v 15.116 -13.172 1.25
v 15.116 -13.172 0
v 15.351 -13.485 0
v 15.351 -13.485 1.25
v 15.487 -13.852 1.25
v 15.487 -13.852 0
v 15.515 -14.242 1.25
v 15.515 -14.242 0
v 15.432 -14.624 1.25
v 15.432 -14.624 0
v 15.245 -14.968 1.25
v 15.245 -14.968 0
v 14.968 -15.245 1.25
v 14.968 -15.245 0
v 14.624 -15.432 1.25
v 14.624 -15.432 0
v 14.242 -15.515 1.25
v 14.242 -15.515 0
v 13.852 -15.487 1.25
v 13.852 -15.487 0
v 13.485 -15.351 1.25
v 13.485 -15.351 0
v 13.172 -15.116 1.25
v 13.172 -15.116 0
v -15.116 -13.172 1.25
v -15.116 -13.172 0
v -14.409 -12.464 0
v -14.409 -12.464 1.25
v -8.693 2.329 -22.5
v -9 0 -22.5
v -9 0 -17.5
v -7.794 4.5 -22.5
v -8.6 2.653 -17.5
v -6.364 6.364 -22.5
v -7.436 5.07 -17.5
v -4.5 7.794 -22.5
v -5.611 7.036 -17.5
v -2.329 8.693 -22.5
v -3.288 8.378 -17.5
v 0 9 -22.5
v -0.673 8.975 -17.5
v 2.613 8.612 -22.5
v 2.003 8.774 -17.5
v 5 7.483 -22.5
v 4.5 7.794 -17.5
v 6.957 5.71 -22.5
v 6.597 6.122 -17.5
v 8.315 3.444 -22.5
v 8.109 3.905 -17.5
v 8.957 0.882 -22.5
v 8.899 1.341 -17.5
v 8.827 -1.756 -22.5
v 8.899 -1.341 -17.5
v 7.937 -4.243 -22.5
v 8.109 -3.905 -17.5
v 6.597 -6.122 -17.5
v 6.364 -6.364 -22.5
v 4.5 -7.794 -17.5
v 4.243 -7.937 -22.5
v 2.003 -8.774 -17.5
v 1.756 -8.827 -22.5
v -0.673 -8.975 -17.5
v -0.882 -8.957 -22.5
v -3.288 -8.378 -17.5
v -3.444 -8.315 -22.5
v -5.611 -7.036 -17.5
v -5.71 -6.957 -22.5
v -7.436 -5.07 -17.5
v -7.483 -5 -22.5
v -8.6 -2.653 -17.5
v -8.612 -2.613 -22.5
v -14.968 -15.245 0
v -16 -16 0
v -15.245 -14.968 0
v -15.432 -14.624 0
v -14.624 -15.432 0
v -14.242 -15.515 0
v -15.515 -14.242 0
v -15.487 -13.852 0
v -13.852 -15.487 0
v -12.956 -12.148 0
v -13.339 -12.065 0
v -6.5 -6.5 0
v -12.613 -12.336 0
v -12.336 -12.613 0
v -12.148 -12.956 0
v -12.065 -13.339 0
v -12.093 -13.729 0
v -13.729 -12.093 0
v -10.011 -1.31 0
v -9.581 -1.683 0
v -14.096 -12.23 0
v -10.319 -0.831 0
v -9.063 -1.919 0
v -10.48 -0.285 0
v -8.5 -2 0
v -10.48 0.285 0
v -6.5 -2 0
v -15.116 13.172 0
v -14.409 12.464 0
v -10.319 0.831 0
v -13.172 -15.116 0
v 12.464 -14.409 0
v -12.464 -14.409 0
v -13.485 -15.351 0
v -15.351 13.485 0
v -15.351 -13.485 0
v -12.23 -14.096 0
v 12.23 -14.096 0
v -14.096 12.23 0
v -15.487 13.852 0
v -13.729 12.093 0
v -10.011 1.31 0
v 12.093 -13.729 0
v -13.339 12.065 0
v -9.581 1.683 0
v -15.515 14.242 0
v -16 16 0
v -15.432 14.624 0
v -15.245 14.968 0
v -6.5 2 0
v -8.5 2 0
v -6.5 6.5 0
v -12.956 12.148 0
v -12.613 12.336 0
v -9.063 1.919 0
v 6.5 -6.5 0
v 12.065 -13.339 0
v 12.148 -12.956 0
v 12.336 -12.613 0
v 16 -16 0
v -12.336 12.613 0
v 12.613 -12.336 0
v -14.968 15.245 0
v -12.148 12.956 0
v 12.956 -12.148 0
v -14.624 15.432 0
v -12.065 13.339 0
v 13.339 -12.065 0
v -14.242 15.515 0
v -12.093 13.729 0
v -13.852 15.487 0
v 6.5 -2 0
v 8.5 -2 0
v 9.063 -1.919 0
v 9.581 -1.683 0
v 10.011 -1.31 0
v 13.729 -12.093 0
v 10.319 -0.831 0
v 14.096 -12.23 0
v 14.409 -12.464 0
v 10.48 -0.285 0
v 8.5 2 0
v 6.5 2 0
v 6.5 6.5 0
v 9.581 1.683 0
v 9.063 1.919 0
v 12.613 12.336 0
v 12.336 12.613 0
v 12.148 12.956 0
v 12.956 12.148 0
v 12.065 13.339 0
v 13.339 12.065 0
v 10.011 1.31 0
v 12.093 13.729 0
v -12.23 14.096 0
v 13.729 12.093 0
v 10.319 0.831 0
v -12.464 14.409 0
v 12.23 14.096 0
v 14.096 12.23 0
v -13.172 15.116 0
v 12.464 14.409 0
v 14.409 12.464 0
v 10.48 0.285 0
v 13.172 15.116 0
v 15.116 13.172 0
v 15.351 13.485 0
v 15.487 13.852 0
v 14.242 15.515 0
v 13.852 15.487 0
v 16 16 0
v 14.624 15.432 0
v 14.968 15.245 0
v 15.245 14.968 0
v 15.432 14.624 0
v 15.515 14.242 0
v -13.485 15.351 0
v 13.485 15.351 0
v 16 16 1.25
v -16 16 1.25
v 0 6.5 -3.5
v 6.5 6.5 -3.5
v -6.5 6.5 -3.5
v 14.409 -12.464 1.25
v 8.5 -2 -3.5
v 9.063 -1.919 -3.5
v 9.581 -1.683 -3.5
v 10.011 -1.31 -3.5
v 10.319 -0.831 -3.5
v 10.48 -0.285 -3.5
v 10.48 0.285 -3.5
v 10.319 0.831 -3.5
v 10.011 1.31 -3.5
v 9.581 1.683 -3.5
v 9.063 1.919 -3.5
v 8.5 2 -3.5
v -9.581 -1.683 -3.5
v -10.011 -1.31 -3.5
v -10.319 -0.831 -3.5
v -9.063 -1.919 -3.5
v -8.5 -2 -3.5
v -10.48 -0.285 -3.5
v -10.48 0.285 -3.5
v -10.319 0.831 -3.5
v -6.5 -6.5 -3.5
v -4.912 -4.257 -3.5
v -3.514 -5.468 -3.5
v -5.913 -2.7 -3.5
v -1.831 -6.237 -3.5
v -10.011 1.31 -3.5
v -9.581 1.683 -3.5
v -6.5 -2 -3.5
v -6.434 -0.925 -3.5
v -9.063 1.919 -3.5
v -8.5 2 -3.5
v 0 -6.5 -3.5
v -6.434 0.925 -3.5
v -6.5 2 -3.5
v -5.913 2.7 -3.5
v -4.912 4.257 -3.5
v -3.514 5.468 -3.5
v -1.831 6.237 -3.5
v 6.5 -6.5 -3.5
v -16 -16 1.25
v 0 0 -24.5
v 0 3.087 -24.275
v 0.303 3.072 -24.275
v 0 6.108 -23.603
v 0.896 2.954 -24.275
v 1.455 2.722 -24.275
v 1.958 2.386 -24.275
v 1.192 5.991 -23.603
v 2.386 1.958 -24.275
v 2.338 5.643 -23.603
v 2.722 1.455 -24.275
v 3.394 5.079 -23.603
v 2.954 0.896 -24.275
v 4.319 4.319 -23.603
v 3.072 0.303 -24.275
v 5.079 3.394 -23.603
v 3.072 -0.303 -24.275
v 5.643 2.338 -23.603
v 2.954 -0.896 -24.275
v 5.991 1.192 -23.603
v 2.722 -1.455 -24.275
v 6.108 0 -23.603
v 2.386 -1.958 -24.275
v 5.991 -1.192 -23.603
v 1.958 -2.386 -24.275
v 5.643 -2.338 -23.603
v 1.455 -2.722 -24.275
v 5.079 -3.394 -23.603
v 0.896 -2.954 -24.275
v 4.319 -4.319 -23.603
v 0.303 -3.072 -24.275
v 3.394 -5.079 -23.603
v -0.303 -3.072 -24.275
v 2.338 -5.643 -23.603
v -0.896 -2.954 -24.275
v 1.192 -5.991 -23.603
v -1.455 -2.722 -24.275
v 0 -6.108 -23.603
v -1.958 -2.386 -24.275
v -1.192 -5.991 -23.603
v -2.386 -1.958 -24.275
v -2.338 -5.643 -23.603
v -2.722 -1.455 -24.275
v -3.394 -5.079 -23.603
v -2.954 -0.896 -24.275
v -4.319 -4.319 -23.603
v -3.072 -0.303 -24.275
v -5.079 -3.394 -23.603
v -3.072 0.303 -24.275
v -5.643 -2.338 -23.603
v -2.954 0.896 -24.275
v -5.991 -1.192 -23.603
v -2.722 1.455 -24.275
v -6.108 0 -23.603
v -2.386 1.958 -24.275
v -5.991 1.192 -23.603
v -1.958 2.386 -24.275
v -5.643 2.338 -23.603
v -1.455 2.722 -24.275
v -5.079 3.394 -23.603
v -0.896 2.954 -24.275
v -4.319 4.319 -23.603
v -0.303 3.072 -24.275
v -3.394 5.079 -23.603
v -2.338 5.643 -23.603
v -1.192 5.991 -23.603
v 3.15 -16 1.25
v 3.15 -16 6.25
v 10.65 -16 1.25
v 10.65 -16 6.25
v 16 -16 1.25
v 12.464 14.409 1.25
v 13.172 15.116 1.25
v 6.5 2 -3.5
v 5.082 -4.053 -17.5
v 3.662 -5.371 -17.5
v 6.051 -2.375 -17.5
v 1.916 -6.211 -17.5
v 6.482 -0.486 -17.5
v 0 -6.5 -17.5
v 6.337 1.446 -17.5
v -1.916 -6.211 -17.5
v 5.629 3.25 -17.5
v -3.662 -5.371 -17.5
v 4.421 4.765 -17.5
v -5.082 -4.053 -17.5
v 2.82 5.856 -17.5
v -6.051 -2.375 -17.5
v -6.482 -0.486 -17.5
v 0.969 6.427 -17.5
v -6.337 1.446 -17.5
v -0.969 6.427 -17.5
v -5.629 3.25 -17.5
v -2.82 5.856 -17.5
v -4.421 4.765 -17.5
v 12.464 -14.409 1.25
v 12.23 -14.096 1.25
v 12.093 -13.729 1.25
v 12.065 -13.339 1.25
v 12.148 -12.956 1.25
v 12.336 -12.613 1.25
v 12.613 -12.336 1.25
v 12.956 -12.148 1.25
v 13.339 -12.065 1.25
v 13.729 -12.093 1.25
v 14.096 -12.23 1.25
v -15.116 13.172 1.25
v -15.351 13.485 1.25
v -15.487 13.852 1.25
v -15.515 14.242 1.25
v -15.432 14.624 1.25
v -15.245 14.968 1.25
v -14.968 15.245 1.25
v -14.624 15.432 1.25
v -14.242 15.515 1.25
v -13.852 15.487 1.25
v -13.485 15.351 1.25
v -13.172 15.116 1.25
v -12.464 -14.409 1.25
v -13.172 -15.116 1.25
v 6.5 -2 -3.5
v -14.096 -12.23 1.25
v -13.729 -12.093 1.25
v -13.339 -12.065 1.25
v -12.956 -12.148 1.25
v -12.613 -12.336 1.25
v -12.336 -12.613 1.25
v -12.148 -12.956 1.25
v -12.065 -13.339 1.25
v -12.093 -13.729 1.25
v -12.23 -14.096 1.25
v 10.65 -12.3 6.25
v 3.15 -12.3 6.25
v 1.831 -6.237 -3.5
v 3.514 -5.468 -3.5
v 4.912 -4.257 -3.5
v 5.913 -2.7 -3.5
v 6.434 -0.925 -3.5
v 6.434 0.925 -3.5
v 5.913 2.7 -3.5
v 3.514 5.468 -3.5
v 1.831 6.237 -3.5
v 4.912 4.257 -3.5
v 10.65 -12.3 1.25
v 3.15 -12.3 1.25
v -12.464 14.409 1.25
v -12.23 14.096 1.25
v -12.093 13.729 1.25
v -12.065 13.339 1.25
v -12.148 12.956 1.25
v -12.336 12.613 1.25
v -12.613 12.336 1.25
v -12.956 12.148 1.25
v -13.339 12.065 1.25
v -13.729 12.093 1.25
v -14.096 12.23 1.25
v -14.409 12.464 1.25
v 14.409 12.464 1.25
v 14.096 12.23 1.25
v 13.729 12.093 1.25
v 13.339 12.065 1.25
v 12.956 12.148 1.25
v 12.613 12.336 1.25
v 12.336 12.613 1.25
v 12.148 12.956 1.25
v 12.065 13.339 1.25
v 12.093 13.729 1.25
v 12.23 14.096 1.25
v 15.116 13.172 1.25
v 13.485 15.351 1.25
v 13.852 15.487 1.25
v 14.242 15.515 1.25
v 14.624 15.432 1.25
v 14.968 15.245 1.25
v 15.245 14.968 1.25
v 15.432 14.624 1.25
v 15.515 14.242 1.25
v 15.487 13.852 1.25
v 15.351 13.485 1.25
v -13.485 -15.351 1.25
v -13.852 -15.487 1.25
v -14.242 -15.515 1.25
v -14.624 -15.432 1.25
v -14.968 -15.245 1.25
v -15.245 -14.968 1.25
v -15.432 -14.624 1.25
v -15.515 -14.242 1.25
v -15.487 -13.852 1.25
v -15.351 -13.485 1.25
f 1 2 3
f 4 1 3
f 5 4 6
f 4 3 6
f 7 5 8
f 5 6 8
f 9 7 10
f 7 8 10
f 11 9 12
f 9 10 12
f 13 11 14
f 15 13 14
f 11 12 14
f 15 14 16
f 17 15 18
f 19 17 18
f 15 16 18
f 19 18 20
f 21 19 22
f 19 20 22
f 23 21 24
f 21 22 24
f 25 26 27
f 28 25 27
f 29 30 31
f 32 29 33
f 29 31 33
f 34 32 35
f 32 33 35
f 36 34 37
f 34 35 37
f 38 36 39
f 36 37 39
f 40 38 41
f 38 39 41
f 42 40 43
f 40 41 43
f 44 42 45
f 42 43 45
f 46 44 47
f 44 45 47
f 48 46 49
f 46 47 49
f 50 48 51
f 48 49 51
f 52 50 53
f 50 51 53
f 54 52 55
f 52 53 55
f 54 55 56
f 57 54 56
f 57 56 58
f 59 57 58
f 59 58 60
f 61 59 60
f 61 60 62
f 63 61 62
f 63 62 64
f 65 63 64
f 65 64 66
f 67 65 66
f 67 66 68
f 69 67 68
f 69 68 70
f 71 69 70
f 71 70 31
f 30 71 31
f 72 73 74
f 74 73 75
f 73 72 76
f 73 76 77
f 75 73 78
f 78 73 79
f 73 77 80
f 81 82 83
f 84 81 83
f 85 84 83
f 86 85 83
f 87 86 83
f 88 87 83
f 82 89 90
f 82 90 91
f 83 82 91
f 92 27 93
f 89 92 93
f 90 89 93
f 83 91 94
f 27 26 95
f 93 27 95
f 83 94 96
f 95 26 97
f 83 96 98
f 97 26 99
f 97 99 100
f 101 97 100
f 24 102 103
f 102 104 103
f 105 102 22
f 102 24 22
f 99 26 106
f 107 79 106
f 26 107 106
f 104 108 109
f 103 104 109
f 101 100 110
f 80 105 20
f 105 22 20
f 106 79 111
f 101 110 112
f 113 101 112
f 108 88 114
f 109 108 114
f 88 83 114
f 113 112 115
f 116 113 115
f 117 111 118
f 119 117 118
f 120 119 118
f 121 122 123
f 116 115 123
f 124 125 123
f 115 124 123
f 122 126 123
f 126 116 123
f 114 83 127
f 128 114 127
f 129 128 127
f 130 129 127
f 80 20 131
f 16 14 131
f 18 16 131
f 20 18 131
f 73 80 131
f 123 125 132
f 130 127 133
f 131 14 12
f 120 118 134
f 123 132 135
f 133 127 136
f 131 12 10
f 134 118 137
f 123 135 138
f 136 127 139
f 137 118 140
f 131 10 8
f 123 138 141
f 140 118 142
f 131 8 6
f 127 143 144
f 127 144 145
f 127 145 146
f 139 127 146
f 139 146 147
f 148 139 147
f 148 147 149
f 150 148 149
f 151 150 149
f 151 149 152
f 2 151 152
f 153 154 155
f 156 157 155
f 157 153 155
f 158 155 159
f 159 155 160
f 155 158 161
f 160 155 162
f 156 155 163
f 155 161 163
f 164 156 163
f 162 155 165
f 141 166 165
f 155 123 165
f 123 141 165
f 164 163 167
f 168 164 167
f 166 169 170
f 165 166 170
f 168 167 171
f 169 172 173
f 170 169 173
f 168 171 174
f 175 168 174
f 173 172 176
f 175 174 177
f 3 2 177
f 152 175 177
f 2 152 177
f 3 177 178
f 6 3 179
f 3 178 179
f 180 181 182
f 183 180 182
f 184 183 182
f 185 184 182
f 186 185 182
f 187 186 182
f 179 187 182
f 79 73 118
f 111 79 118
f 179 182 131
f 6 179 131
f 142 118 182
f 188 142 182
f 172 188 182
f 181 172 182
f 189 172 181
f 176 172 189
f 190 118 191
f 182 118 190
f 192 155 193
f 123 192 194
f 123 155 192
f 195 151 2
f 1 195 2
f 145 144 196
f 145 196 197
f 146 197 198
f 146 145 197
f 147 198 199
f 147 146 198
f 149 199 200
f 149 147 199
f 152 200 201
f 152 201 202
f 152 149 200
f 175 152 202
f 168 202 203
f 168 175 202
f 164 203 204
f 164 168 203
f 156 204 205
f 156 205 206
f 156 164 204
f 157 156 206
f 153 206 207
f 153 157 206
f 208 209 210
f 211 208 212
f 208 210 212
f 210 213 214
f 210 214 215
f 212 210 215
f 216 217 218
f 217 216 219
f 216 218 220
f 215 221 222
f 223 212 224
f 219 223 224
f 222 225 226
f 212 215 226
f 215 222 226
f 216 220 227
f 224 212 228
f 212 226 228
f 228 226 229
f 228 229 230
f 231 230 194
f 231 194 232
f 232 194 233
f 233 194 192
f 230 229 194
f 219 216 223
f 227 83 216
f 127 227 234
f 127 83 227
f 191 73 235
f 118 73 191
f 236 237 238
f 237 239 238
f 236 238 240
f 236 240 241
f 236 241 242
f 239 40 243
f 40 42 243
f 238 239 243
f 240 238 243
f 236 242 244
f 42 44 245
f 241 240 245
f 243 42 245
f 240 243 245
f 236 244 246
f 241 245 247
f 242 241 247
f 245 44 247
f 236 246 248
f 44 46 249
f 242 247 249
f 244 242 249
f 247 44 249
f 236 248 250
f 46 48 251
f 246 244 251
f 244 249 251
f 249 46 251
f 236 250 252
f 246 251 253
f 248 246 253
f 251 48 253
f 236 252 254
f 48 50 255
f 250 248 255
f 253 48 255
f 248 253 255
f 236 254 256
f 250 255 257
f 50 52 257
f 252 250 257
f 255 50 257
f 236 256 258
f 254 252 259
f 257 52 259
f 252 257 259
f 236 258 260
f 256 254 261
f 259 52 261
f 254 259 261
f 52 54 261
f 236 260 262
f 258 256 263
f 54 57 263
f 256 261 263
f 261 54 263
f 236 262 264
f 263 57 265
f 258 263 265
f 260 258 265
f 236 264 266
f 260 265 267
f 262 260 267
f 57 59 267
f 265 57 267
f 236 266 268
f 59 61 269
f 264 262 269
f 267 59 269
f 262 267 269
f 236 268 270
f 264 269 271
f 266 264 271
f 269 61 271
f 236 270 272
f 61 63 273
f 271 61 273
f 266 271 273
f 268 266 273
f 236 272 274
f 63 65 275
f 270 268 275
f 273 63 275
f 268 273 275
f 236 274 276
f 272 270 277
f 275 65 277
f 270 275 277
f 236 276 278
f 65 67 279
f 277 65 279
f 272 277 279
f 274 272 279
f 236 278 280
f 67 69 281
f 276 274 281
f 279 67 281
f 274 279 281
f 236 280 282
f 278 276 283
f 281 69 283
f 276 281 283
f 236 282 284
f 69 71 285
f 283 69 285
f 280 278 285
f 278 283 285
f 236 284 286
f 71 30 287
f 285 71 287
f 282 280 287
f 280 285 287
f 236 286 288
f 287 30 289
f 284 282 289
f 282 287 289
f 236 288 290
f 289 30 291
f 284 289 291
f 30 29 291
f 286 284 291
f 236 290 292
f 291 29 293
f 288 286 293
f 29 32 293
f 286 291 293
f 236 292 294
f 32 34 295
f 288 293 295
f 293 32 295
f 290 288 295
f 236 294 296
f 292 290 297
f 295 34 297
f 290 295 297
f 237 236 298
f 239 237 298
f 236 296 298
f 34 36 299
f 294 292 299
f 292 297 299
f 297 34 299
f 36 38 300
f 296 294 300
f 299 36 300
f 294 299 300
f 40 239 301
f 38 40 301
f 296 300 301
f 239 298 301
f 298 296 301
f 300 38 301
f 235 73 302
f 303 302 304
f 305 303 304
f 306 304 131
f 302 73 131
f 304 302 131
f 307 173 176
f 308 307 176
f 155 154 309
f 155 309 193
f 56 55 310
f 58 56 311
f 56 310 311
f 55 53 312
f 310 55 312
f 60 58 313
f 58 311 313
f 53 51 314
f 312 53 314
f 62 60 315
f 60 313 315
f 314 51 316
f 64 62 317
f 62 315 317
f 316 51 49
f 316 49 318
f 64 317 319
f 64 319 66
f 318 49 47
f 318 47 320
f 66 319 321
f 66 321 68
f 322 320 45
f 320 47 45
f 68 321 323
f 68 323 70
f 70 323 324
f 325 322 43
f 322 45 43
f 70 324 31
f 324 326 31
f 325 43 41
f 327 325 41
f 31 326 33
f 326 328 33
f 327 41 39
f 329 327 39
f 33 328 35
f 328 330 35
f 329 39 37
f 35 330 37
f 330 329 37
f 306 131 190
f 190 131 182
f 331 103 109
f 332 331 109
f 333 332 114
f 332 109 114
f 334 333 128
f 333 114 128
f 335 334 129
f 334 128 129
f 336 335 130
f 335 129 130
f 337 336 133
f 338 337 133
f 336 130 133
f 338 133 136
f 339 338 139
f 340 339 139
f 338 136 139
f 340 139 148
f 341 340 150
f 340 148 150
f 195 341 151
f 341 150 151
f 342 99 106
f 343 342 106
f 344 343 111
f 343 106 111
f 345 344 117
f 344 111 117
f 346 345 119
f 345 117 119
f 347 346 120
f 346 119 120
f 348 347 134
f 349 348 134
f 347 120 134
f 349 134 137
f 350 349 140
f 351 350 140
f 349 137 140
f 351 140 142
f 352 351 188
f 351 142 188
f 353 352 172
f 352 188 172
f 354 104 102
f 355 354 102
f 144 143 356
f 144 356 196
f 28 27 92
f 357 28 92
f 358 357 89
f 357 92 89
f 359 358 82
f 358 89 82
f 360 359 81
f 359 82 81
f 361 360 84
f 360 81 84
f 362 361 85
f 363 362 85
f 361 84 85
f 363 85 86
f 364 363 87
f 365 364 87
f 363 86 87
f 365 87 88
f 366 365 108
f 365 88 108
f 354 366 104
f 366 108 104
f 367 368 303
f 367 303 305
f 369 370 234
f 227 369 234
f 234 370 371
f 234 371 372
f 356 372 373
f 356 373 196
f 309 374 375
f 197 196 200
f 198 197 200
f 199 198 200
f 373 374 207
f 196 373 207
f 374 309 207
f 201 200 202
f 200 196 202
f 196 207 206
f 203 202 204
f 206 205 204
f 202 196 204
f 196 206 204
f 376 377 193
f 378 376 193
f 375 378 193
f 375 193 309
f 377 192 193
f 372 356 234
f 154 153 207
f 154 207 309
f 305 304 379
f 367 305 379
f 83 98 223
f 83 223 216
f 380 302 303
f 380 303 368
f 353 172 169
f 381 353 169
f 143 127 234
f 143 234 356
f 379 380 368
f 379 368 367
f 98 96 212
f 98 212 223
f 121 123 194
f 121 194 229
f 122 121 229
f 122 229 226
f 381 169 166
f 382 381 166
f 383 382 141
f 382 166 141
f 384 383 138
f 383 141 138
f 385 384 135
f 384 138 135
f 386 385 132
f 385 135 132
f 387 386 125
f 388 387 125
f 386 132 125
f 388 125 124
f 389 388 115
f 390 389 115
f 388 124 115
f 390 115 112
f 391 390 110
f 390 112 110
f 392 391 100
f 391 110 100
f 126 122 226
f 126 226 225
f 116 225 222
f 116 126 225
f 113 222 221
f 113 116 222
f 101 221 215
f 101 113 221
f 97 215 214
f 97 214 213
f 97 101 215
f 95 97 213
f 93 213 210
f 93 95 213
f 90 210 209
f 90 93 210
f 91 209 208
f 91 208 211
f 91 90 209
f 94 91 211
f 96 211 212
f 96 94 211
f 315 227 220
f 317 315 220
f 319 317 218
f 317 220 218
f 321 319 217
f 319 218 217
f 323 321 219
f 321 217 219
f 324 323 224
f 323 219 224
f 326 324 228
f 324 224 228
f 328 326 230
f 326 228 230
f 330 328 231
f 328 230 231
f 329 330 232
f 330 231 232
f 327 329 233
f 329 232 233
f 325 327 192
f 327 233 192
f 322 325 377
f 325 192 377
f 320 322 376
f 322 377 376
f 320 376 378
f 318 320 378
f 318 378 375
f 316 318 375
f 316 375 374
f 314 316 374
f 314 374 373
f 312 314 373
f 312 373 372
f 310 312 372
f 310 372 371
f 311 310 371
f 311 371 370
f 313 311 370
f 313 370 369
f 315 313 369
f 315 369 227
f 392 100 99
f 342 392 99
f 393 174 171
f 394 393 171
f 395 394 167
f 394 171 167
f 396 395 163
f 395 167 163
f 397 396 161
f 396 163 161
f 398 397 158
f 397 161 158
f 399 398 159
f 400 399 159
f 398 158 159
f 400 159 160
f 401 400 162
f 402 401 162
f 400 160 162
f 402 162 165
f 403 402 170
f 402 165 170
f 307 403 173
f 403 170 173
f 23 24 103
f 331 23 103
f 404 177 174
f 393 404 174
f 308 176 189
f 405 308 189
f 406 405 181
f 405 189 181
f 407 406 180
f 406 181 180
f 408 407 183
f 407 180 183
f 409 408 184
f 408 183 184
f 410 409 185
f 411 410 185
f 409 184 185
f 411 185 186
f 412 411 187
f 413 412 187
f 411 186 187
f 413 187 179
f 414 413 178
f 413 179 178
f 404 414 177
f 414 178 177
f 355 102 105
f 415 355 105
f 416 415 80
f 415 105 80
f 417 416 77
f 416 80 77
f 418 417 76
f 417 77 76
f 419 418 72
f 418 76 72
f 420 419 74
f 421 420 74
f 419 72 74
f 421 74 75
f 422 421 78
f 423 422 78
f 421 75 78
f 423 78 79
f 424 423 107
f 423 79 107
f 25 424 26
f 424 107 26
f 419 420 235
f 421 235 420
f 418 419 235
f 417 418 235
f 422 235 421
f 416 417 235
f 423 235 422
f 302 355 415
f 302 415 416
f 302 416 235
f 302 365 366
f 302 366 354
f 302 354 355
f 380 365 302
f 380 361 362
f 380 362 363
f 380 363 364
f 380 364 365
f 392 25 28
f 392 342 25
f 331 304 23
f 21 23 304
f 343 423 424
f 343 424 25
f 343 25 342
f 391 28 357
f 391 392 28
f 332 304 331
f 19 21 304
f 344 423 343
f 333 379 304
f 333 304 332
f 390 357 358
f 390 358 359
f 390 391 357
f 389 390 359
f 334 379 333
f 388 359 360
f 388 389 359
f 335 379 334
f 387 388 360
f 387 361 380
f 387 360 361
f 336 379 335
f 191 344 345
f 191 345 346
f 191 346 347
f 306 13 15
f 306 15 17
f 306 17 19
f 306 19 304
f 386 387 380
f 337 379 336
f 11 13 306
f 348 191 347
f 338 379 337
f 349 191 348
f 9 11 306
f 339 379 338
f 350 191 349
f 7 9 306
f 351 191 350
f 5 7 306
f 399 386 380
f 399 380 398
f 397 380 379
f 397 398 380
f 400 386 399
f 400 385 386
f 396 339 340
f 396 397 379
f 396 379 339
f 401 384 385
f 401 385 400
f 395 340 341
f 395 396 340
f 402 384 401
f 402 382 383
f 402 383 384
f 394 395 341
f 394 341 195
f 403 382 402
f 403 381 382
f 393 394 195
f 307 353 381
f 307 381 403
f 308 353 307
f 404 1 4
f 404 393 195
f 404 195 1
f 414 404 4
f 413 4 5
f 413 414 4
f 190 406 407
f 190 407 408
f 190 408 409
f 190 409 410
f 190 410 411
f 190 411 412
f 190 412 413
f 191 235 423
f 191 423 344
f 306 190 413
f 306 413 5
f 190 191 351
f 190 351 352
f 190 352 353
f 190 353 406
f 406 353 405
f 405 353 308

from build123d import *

# Parameters (mm, degrees)
ESQUISSE1_W        = 32
ESQUISSE1_H        = 32
BOSS_EXTRU_1_DEPTH = 1.25
ESQUISSE2_W        = 7.5
ESQUISSE2_H        = 3.7
BOSS_EXTRU_2_DEPTH = 5
BOSS_EXTRU_3_DEPTH = 3.5
ESQUISSE4_R        = 6.5
BOSS_EXTRU_4_DEPTH = 14
ESQUISSE5_R        = 9
BOSS_EXTRU_5_DEPTH = 5


with BuildPart() as part:
    # Esquisse1 → Boss.-Extru.1 (new body)
    with BuildSketch(Plane.XY):
        Rectangle(ESQUISSE1_W, ESQUISSE1_H)
        with BuildLine():
            Line((-13.171572875, 15.116116524), (-12.464466094, 14.409009742))
            ThreePointArc((-12.464466094, 14.409009742), (-12.464466094, 12.464466094), (-14.409009742, 12.464466094))
            Line((-14.409009742, 12.464466094), (-15.116116524, 13.171572875))
            ThreePointArc((-15.116116524, 13.171572875), (-15.116116524, 15.116116524), (-13.171572875, 15.116116524))
        make_face(mode=Mode.SUBTRACT)
        with BuildLine():
            Line((15.116116524, 13.171572875), (14.409009742, 12.464466094))
            ThreePointArc((14.409009742, 12.464466094), (12.464466094, 12.464466094), (12.464466094, 14.409009742))
            Line((12.464466094, 14.409009742), (13.171572875, 15.116116524))
            ThreePointArc((13.171572875, 15.116116524), (15.116116524, 15.116116524), (15.116116524, 13.171572875))
        make_face(mode=Mode.SUBTRACT)
        with BuildLine():
            Line((13.171572875, -15.116116524), (12.464466094, -14.409009742))
            ThreePointArc((12.464466094, -14.409009742), (12.464466094, -12.464466094), (14.409009742, -12.464466094))
            Line((14.409009742, -12.464466094), (15.116116524, -13.171572875))
            ThreePointArc((15.116116524, -13.171572875), (15.116116524, -15.116116524), (13.171572875, -15.116116524))
        make_face(mode=Mode.SUBTRACT)
        with BuildLine():
            Line((-15.116116524, -13.171572875), (-14.409009742, -12.464466094))
            ThreePointArc((-14.409009742, -12.464466094), (-12.464466094, -12.464466094), (-12.464466094, -14.409009742))
            Line((-12.464466094, -14.409009742), (-13.171572875, -15.116116524))
            ThreePointArc((-13.171572875, -15.116116524), (-15.116116524, -15.116116524), (-15.116116524, -13.171572875))
        make_face(mode=Mode.SUBTRACT)
    extrude(amount=BOSS_EXTRU_1_DEPTH)

    # Esquisse2 → Boss.-Extru.2 (add)
    with BuildSketch(Plane.XY.offset(1.25)):
        with Locations((6.9, -14.15)):
            Rectangle(ESQUISSE2_W, ESQUISSE2_H)
    extrude(amount=BOSS_EXTRU_2_DEPTH)

    # Esquisse3 → Boss.-Extru.3 (add)
    with BuildSketch(Plane(origin=(0, 0, 0), x_dir=(-1, 0, 0), z_dir=(0, 0, -1))):
        with BuildLine():
            Line((-6.5, 6.5), (6.5, 6.5))
            Line((6.5, 6.5), (6.5, 2))
            Line((6.5, 2), (8.5, 2))
            ThreePointArc((8.5, 2), (10.5, 0), (8.5, -2))
            Line((8.5, -2), (6.5, -2))
            Line((6.5, -2), (6.5, -6.5))
            Line((6.5, -6.5), (-6.5, -6.5))
            Line((-6.5, -6.5), (-6.5, -2))
            Line((-6.5, -2), (-8.5, -2))
            ThreePointArc((-8.5, -2), (-10.5, 0), (-8.5, 2))
            Line((-8.5, 2), (-6.5, 2))
            Line((-6.5, 2), (-6.5, 6.5))
        make_face()
    extrude(amount=BOSS_EXTRU_3_DEPTH)

    # Esquisse4 → Boss.-Extru.4 (add)
    with BuildSketch(Plane(origin=(0, 0, -3.5), x_dir=(-1, 0, 0), z_dir=(0, 0, -1))):
        with Locations(Location((0, 0, 0), (0, 0, 270))):
            Circle(ESQUISSE4_R)
    extrude(amount=BOSS_EXTRU_4_DEPTH)

    # Esquisse5 → Boss.-Extru.5 (add)
    with BuildSketch(Plane(origin=(0, 0, -17.5), x_dir=(-1, 0, 0), z_dir=(0, 0, -1))):
        Circle(ESQUISSE5_R)
    extrude(amount=BOSS_EXTRU_5_DEPTH)

    # Esquisse6 → Révolution2 (revolve)
    with BuildSketch(Plane(origin=(0, 0, 0), x_dir=(0, 0, -1), z_dir=(1, 0, 0))):
        with BuildLine():
            Line((22.5, 0), (24.5, 0))
            ThreePointArc((24.5, 0), (23.993975029, 4.609772229), (22.5, 9))
            Line((22.5, 9), (22.5, 0))
        make_face()
    revolve(axis=Axis((0, 0, -22.5), (0, 0, -1)))


solid = part.part
